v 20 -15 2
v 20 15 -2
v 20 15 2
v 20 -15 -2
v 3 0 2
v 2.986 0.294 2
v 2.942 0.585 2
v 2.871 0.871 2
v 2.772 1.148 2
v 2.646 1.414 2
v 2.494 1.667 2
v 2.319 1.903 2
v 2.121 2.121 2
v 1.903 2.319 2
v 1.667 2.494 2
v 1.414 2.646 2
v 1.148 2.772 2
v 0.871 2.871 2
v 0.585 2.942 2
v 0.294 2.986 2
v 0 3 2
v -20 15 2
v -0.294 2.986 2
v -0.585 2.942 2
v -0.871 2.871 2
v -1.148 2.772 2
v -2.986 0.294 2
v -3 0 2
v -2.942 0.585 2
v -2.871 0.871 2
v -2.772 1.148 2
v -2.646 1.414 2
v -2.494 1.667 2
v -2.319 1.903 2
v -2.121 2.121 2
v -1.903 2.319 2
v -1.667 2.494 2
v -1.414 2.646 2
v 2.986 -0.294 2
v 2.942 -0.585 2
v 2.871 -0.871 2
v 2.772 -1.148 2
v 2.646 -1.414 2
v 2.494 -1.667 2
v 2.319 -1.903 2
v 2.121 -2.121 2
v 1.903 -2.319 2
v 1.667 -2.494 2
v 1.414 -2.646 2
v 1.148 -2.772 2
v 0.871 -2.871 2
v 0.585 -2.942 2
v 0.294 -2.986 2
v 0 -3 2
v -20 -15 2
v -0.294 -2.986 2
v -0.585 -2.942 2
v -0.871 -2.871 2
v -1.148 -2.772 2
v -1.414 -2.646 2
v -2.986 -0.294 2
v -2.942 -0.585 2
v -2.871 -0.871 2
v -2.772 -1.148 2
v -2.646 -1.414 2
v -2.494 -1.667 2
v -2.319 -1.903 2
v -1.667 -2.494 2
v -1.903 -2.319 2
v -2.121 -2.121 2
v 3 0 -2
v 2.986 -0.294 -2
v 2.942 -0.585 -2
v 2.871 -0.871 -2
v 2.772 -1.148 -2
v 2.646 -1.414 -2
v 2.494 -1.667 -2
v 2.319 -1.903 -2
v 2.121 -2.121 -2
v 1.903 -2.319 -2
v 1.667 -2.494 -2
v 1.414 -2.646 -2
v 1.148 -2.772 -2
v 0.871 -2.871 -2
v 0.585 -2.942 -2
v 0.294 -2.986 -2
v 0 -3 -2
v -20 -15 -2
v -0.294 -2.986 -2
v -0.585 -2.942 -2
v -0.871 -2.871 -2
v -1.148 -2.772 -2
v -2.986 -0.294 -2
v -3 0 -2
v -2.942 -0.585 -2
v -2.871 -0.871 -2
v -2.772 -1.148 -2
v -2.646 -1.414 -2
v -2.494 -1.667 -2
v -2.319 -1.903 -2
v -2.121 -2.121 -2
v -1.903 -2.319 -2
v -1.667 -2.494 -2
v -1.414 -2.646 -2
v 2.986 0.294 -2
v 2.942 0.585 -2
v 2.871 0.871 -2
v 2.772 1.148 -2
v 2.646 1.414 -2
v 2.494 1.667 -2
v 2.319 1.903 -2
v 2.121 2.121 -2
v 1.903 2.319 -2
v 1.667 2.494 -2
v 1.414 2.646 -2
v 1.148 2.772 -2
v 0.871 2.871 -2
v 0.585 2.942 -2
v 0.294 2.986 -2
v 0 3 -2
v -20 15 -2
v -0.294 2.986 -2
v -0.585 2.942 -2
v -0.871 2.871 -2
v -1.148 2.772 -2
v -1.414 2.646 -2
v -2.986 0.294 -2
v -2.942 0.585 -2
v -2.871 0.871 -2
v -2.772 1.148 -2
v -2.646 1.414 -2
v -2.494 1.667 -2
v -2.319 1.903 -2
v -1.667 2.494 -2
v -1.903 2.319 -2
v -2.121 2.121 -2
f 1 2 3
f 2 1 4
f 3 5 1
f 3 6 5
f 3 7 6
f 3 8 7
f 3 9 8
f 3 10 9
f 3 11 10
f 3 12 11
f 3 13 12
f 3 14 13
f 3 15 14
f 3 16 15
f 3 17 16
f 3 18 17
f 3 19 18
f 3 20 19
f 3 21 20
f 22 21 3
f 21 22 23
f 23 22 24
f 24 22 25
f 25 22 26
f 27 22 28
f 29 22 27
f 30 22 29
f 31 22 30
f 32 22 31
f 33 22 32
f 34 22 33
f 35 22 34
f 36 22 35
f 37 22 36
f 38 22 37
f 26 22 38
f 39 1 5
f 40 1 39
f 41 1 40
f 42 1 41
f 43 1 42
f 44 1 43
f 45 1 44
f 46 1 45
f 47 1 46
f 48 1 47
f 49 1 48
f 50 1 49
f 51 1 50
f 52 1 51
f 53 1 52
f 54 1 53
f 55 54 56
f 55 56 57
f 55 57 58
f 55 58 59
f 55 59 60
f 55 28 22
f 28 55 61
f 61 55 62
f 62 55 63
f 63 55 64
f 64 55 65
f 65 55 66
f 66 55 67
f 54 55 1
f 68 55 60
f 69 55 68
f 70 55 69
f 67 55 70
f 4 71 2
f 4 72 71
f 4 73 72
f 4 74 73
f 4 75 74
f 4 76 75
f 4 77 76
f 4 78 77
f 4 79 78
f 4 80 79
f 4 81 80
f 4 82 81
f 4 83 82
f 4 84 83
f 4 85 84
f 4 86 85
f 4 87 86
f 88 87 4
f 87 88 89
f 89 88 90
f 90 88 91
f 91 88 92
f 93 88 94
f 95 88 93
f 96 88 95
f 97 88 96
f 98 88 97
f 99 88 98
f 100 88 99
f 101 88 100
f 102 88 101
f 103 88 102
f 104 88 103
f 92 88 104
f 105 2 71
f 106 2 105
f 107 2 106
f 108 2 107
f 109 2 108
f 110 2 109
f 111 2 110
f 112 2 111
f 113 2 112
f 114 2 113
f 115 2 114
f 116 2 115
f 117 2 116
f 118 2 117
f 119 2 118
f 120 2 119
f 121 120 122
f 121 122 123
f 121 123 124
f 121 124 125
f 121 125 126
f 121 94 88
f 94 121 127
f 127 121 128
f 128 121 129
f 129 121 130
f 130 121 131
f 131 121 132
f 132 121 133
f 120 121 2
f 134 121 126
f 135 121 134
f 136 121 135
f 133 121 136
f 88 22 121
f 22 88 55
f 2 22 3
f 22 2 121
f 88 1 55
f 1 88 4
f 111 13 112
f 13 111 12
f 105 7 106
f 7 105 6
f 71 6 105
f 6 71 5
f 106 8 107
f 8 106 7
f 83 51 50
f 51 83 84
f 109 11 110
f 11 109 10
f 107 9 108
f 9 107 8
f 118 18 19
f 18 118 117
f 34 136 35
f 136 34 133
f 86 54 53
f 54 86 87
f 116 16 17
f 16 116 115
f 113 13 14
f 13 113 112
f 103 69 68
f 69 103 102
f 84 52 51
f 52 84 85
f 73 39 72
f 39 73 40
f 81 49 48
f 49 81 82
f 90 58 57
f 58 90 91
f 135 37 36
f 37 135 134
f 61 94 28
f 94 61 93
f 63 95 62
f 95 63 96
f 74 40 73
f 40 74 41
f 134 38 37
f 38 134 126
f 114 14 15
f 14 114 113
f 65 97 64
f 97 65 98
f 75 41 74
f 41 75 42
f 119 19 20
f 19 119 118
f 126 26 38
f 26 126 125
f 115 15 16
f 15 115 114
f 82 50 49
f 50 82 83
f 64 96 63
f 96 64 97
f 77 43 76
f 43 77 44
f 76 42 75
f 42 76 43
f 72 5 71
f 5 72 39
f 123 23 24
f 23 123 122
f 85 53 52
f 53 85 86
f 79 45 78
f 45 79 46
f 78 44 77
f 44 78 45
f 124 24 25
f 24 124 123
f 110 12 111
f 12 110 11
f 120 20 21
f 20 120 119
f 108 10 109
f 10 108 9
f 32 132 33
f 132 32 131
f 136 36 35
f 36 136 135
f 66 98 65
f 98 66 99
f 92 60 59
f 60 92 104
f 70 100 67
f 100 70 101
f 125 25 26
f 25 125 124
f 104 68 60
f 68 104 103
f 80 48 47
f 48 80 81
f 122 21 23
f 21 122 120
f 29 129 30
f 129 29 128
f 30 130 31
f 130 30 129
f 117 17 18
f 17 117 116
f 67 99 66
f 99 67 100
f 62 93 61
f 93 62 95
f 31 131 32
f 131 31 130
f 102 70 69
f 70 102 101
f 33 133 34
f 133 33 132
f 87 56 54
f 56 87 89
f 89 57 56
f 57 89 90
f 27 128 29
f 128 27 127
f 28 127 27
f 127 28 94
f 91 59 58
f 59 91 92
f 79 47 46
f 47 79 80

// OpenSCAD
// Mounting plate 40 x 30 x 4 mm with central Ø6 mm through-bore
difference() {
    cube([40, 30, 4], center = true);
    cylinder(h = 6, d = 6, center = true, $fn = 64);
}
